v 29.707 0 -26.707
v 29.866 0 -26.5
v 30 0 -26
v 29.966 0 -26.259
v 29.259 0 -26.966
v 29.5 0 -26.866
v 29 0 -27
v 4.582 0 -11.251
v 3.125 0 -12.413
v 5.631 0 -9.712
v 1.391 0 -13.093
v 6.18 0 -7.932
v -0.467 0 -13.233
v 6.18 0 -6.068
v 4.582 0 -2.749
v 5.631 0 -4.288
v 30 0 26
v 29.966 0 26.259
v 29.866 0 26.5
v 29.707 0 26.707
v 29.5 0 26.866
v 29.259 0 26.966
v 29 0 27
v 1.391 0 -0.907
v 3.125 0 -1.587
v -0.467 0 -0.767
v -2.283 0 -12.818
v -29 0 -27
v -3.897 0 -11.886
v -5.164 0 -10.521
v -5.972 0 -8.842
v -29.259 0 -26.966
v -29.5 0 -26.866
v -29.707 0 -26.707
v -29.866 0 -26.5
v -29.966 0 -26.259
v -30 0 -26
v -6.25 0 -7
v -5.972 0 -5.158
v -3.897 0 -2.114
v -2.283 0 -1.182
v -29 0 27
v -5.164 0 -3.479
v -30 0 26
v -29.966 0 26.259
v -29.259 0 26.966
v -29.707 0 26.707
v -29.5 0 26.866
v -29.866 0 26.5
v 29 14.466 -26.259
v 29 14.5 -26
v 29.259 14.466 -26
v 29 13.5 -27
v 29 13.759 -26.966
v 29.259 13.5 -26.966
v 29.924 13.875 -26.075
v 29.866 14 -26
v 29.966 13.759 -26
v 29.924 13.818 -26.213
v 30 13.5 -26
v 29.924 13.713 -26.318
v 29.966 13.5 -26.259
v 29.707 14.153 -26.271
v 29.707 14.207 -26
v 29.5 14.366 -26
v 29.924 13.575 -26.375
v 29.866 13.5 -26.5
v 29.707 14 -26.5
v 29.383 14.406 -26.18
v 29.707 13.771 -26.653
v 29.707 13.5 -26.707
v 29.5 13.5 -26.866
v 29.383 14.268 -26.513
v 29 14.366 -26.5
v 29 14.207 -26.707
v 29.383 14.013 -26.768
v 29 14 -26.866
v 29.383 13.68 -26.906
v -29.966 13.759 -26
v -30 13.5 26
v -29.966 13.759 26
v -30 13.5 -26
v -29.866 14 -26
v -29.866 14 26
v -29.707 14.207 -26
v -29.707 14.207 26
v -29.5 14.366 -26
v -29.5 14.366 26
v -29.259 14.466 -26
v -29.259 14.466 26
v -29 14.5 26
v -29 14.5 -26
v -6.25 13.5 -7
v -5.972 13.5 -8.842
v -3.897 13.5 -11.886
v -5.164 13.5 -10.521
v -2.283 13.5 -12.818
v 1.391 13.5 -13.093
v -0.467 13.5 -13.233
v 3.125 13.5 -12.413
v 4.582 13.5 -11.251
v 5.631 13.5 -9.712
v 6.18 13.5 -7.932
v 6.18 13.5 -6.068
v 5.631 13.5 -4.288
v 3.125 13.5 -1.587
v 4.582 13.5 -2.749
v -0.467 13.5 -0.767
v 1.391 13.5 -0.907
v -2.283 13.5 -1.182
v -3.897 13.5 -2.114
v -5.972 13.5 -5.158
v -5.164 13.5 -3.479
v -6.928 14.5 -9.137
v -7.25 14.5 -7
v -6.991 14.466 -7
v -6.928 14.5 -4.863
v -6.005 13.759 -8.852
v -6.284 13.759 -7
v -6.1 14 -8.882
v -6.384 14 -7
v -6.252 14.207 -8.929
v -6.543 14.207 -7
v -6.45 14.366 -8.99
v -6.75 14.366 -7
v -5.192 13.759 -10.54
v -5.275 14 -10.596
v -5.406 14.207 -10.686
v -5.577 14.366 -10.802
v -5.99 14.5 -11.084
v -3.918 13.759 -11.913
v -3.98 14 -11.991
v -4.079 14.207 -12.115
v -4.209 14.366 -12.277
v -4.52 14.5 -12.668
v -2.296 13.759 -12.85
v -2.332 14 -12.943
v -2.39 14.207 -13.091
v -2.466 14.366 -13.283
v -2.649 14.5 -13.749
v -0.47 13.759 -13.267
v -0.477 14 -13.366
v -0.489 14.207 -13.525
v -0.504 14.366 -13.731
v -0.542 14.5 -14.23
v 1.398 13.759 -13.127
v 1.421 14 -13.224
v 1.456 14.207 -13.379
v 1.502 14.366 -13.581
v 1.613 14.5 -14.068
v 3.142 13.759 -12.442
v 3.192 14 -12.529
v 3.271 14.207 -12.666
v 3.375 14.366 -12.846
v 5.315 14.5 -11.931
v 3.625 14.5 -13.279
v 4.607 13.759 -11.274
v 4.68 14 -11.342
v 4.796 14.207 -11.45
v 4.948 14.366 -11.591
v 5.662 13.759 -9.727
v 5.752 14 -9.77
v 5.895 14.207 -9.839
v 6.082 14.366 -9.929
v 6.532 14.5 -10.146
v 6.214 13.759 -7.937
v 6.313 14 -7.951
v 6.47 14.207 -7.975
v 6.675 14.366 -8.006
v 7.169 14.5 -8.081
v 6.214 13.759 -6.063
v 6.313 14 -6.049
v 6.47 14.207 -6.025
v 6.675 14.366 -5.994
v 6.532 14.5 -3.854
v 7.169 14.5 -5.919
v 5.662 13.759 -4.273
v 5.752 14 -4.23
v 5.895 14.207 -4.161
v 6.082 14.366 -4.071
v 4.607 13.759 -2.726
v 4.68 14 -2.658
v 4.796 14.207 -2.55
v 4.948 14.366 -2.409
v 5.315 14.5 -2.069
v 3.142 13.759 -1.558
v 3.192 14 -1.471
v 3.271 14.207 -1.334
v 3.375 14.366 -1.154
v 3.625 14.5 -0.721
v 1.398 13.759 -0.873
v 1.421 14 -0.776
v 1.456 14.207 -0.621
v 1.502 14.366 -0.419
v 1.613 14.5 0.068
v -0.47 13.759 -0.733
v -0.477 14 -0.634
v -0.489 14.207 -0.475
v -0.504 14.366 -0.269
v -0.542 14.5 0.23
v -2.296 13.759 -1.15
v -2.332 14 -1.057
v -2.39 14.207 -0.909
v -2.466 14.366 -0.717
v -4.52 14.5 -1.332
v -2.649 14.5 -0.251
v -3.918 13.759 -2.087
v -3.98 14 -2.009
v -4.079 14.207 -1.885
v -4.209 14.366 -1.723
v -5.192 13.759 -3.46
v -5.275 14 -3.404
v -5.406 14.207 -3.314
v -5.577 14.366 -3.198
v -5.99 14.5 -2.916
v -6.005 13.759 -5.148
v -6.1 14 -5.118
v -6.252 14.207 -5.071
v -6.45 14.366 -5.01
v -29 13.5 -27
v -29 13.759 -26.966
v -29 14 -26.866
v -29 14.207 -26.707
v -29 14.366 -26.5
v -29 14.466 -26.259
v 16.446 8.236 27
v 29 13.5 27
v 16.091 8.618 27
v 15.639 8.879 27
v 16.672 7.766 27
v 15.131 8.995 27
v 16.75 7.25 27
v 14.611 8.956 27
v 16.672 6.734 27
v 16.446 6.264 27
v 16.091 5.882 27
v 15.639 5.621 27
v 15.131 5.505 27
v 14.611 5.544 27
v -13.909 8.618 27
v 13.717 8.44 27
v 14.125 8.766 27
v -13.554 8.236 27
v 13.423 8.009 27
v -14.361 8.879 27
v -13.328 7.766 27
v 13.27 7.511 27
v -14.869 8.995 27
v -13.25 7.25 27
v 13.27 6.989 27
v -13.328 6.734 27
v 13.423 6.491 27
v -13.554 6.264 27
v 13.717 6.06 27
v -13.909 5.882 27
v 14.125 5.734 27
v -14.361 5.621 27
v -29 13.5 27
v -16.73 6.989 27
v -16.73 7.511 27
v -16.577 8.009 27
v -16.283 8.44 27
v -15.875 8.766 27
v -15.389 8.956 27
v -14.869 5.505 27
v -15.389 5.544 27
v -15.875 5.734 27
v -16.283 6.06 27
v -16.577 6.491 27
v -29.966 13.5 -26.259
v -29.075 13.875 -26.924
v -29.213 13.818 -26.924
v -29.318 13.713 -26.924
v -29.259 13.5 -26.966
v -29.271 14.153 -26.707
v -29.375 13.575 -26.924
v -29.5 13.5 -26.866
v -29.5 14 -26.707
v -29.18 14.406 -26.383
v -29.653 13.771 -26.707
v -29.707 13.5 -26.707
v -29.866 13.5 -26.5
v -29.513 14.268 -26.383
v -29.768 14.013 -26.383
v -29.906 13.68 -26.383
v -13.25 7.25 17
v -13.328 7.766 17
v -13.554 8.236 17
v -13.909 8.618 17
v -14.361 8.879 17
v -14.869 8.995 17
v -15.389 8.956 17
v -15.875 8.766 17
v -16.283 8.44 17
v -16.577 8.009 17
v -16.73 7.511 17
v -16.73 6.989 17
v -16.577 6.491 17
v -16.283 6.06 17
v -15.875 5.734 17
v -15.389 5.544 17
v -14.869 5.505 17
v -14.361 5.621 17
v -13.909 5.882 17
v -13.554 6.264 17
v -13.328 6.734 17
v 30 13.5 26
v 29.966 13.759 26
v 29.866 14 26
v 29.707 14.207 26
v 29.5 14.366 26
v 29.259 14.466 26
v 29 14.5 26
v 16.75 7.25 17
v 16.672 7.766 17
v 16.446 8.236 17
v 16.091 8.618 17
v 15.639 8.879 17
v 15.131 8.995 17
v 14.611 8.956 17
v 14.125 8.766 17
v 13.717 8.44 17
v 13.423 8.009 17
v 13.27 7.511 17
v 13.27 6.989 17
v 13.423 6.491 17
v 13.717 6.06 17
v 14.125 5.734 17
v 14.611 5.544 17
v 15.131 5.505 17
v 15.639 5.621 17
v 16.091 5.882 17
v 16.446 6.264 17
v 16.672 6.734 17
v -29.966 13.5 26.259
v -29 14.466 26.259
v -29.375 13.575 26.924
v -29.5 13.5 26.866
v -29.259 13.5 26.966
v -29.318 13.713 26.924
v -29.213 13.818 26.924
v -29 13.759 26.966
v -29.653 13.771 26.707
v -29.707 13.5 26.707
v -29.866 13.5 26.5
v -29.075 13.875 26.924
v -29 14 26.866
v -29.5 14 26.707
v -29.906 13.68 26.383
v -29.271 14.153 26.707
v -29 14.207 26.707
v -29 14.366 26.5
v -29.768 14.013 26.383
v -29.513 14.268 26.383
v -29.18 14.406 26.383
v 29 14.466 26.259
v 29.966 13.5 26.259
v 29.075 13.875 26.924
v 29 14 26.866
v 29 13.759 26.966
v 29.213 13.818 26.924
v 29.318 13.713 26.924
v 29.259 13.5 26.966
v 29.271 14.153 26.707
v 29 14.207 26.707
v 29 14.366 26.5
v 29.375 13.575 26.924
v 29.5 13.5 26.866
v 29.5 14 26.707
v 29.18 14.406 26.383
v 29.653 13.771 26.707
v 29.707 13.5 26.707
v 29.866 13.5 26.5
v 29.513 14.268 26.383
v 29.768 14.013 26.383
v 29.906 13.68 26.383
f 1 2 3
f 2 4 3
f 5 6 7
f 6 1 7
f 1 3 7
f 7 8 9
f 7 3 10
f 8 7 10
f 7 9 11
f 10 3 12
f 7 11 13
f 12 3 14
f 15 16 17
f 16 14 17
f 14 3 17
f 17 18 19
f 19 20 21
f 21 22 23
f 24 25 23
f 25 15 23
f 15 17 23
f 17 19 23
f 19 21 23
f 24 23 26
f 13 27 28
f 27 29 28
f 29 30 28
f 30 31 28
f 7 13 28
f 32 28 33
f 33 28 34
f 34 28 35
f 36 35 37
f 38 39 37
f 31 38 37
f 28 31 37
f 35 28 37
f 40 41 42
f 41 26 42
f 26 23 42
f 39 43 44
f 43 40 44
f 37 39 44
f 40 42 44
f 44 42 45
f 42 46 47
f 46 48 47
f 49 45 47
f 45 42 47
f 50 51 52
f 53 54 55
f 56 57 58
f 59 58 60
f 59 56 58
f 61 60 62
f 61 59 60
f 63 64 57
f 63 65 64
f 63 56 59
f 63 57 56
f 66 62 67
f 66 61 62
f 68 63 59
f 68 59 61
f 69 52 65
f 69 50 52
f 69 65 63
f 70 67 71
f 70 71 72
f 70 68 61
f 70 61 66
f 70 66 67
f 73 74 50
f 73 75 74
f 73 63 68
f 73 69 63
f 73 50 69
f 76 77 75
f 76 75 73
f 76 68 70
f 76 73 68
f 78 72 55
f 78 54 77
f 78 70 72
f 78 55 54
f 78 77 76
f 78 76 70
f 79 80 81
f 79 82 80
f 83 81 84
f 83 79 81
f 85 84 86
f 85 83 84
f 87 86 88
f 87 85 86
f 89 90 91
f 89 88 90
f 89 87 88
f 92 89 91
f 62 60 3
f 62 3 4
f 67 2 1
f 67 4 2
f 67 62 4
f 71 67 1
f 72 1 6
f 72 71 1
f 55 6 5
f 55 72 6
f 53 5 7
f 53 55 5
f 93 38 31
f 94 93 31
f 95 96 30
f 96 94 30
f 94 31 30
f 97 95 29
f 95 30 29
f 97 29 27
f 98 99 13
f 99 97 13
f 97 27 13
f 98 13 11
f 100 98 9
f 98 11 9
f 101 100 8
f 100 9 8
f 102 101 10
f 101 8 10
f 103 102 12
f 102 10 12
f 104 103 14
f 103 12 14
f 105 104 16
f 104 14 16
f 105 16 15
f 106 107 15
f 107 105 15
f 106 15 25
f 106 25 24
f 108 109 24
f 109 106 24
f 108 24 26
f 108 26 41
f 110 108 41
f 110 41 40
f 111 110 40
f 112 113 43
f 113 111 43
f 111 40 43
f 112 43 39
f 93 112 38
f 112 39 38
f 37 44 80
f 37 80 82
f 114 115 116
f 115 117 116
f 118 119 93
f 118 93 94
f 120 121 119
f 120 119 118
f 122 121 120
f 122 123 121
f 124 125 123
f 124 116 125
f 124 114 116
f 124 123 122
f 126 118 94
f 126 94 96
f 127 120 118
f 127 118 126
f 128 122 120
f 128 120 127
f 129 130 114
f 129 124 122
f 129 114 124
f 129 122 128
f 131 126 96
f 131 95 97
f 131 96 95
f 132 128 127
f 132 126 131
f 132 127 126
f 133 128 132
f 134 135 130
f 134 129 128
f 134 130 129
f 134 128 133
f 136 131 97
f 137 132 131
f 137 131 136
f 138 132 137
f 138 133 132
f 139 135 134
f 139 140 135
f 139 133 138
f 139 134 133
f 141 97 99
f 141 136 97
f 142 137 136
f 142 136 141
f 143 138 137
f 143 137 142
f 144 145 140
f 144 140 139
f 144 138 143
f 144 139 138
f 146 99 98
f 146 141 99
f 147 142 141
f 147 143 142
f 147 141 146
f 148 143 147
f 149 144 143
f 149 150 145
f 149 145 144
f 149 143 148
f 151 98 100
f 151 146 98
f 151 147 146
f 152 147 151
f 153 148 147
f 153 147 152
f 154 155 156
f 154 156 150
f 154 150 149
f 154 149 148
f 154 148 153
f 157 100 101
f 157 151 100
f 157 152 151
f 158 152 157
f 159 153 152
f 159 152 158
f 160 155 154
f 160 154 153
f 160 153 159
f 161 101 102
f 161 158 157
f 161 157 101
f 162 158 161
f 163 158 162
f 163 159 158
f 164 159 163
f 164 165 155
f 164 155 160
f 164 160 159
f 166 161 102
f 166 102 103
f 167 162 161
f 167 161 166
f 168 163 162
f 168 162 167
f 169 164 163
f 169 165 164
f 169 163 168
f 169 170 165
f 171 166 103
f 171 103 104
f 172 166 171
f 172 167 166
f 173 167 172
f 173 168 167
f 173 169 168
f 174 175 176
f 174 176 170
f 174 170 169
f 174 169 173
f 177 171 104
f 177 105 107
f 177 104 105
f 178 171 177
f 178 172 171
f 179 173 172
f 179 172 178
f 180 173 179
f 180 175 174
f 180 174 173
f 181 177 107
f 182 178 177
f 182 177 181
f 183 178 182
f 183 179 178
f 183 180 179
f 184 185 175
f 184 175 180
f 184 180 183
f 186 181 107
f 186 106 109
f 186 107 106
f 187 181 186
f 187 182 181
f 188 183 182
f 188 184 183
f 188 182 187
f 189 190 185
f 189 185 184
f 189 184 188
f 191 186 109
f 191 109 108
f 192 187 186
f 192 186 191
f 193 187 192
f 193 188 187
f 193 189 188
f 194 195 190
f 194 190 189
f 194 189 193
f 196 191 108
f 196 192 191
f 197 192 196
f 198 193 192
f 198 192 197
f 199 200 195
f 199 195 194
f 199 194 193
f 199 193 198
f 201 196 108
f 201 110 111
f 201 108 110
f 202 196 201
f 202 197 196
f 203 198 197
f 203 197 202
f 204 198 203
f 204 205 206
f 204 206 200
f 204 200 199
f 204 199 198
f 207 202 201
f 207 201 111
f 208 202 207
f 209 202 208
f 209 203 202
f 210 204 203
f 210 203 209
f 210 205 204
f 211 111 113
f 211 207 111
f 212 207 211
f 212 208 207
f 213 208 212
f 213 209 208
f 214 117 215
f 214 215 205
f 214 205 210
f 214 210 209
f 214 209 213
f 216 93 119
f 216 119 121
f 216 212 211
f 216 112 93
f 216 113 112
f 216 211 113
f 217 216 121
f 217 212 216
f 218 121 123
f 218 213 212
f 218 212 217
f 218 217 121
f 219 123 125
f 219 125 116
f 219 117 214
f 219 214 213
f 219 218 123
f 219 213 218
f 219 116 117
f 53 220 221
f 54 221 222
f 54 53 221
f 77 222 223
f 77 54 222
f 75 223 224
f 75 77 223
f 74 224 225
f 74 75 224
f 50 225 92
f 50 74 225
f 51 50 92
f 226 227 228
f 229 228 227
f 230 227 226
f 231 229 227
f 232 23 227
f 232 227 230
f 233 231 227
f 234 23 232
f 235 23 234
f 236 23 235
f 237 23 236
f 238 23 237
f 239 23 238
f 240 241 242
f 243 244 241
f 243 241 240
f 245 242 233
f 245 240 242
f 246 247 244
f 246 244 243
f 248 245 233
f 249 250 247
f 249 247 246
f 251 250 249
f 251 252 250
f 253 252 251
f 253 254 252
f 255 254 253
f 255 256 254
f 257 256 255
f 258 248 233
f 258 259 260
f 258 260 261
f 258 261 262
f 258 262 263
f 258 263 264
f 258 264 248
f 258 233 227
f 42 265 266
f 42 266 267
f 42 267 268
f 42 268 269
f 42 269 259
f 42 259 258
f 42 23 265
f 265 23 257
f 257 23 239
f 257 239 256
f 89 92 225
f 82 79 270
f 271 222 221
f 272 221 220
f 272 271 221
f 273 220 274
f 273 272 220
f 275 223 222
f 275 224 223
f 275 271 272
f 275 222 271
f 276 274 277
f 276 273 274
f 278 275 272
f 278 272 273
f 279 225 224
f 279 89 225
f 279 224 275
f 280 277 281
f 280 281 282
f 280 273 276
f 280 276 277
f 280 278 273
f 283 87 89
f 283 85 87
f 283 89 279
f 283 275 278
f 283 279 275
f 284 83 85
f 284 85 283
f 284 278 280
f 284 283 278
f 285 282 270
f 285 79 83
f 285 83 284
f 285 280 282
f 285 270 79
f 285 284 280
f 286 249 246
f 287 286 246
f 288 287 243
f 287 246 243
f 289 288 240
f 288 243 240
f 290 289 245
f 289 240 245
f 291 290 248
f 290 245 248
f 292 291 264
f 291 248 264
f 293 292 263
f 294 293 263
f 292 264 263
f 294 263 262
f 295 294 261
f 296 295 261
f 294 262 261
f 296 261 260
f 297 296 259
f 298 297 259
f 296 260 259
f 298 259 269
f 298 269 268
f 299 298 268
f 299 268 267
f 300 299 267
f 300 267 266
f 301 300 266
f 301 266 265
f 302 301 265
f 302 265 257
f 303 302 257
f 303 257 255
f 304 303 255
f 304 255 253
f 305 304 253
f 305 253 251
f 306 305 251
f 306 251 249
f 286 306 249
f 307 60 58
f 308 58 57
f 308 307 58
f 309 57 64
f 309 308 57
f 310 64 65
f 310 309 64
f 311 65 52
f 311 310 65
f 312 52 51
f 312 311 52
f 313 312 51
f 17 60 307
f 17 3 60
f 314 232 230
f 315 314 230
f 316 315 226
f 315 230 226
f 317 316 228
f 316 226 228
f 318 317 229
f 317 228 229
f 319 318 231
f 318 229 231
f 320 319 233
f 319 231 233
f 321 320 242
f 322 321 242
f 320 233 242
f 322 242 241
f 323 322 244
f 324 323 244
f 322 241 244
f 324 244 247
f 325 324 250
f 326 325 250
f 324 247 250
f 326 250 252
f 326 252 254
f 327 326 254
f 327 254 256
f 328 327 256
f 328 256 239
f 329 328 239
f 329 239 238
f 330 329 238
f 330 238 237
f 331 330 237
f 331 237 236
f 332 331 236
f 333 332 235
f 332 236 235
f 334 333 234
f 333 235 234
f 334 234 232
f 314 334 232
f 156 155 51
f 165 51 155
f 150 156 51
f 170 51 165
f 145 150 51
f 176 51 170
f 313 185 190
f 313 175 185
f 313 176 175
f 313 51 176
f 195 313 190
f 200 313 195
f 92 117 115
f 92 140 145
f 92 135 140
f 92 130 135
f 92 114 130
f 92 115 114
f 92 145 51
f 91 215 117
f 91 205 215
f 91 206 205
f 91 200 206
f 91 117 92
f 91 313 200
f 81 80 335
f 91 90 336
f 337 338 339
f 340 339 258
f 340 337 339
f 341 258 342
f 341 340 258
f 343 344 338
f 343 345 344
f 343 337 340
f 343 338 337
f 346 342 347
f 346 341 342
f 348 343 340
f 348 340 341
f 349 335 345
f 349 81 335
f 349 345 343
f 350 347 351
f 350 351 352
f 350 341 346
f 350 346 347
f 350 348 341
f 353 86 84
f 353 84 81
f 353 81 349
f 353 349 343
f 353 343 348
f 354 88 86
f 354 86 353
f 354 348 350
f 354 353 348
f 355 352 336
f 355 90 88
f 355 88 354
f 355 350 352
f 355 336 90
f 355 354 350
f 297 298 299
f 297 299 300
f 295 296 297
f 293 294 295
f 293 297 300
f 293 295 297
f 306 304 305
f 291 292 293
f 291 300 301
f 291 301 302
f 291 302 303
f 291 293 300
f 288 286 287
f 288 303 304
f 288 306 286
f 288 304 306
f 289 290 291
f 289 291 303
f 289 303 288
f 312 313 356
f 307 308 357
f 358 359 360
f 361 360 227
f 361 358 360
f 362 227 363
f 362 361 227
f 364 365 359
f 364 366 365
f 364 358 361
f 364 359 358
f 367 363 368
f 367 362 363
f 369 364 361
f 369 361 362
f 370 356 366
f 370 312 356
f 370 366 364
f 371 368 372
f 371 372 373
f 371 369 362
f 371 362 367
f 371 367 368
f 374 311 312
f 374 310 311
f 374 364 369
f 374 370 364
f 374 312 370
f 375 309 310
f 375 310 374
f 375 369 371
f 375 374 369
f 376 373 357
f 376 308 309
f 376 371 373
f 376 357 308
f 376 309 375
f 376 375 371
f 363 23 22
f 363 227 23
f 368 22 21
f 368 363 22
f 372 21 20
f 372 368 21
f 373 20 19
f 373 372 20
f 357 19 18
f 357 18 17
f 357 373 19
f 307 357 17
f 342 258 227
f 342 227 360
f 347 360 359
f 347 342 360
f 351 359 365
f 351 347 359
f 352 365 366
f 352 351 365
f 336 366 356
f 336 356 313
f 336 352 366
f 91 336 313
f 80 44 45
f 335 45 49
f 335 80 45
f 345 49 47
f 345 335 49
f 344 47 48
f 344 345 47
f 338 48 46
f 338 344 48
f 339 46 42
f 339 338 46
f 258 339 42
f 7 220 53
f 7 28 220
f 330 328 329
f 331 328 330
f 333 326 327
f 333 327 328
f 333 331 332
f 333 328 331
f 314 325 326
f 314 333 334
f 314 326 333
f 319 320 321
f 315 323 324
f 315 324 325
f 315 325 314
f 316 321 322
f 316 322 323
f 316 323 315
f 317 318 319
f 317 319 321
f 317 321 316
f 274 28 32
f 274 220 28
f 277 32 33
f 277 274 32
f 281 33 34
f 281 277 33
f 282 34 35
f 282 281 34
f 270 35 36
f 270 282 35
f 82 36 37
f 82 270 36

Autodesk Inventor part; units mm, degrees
ref_plane "YZ Plane" through (0, 0, 0) normal (1, 0, 0) x (0, 1, 0)
ref_plane "XZ Plane" through (0, 0, 0) normal (0, 1, 0) x (-1, 0, 0)
ref_plane "XY Plane" through (0, 0, 0) normal (0, 0, 1) x (1, 0, 0)
sketch "Esquisse1" plane through (0, 0, 0) normal (0, 1, 0) x (-1, 0, 0)
  line L0 (-30, 27) -> (30, 27)
  line L1 (30, 27) -> (30, -27)
  line L2 (30, -27) -> (-30, -27)
  line L3 (-30, -27) -> (-30, 27)
  line L4 (-30, 27) -> (30, -27) construction
  line L5 (30, 27) -> (-30, -27) construction
  circle A0 centre (0, -7) radius 6.25
  point P0 (0, 0)
  dimension "d0" = 54
  dimension "d1" = 60
  dimension "d2" = 34
  dimension "d3" = 12.5
extrude "Extrusion1" add sketch "Esquisse1" along normal blind 14.5
sketch "Esquisse2" plane through (-30, 0, 27) normal (0, 0, 1) x (1, 0, 0)
  line L0 (0, 0) -> (0, 14.5) projected
  line L1 (60, 0) -> (0, 0) projected
  line L2 (0, 14.5) -> (60, 14.5)
  line L3 (60, 14.5) -> (60, 0)
  line L4 (60, 0) -> (0, 0)
  line L5 (0, 0) -> (0, 14.5)
  line L6 (0, 7.25) -> (60, 7.25)
  circle A0 centre (15, 7.25) radius 1.75
  circle A1 centre (45, 7.25) radius 1.75
  point P0 (30, 0)
  dimension "d6" = 15
  dimension "d7" = 15
  dimension "d8" = 3.5
fillet "Congé1" radius 1 9 edges at (-30, 14.5, 0) (0, 14.5, -27) (30, 14.5, 0) (0, 14.5, 27) (30, 7.25, 27) (-30, 7.25, 27) (-30, 7.25, -27) (30, 7.25, -27) (6.25, 14.5, -7)
extrude "Extrusion2" cut sketch "Esquisse2" against normal blind 10 contours A0 L6 | L6 A0 | A1 L6 | L6 A1
properties part number "dessus_cadre"
